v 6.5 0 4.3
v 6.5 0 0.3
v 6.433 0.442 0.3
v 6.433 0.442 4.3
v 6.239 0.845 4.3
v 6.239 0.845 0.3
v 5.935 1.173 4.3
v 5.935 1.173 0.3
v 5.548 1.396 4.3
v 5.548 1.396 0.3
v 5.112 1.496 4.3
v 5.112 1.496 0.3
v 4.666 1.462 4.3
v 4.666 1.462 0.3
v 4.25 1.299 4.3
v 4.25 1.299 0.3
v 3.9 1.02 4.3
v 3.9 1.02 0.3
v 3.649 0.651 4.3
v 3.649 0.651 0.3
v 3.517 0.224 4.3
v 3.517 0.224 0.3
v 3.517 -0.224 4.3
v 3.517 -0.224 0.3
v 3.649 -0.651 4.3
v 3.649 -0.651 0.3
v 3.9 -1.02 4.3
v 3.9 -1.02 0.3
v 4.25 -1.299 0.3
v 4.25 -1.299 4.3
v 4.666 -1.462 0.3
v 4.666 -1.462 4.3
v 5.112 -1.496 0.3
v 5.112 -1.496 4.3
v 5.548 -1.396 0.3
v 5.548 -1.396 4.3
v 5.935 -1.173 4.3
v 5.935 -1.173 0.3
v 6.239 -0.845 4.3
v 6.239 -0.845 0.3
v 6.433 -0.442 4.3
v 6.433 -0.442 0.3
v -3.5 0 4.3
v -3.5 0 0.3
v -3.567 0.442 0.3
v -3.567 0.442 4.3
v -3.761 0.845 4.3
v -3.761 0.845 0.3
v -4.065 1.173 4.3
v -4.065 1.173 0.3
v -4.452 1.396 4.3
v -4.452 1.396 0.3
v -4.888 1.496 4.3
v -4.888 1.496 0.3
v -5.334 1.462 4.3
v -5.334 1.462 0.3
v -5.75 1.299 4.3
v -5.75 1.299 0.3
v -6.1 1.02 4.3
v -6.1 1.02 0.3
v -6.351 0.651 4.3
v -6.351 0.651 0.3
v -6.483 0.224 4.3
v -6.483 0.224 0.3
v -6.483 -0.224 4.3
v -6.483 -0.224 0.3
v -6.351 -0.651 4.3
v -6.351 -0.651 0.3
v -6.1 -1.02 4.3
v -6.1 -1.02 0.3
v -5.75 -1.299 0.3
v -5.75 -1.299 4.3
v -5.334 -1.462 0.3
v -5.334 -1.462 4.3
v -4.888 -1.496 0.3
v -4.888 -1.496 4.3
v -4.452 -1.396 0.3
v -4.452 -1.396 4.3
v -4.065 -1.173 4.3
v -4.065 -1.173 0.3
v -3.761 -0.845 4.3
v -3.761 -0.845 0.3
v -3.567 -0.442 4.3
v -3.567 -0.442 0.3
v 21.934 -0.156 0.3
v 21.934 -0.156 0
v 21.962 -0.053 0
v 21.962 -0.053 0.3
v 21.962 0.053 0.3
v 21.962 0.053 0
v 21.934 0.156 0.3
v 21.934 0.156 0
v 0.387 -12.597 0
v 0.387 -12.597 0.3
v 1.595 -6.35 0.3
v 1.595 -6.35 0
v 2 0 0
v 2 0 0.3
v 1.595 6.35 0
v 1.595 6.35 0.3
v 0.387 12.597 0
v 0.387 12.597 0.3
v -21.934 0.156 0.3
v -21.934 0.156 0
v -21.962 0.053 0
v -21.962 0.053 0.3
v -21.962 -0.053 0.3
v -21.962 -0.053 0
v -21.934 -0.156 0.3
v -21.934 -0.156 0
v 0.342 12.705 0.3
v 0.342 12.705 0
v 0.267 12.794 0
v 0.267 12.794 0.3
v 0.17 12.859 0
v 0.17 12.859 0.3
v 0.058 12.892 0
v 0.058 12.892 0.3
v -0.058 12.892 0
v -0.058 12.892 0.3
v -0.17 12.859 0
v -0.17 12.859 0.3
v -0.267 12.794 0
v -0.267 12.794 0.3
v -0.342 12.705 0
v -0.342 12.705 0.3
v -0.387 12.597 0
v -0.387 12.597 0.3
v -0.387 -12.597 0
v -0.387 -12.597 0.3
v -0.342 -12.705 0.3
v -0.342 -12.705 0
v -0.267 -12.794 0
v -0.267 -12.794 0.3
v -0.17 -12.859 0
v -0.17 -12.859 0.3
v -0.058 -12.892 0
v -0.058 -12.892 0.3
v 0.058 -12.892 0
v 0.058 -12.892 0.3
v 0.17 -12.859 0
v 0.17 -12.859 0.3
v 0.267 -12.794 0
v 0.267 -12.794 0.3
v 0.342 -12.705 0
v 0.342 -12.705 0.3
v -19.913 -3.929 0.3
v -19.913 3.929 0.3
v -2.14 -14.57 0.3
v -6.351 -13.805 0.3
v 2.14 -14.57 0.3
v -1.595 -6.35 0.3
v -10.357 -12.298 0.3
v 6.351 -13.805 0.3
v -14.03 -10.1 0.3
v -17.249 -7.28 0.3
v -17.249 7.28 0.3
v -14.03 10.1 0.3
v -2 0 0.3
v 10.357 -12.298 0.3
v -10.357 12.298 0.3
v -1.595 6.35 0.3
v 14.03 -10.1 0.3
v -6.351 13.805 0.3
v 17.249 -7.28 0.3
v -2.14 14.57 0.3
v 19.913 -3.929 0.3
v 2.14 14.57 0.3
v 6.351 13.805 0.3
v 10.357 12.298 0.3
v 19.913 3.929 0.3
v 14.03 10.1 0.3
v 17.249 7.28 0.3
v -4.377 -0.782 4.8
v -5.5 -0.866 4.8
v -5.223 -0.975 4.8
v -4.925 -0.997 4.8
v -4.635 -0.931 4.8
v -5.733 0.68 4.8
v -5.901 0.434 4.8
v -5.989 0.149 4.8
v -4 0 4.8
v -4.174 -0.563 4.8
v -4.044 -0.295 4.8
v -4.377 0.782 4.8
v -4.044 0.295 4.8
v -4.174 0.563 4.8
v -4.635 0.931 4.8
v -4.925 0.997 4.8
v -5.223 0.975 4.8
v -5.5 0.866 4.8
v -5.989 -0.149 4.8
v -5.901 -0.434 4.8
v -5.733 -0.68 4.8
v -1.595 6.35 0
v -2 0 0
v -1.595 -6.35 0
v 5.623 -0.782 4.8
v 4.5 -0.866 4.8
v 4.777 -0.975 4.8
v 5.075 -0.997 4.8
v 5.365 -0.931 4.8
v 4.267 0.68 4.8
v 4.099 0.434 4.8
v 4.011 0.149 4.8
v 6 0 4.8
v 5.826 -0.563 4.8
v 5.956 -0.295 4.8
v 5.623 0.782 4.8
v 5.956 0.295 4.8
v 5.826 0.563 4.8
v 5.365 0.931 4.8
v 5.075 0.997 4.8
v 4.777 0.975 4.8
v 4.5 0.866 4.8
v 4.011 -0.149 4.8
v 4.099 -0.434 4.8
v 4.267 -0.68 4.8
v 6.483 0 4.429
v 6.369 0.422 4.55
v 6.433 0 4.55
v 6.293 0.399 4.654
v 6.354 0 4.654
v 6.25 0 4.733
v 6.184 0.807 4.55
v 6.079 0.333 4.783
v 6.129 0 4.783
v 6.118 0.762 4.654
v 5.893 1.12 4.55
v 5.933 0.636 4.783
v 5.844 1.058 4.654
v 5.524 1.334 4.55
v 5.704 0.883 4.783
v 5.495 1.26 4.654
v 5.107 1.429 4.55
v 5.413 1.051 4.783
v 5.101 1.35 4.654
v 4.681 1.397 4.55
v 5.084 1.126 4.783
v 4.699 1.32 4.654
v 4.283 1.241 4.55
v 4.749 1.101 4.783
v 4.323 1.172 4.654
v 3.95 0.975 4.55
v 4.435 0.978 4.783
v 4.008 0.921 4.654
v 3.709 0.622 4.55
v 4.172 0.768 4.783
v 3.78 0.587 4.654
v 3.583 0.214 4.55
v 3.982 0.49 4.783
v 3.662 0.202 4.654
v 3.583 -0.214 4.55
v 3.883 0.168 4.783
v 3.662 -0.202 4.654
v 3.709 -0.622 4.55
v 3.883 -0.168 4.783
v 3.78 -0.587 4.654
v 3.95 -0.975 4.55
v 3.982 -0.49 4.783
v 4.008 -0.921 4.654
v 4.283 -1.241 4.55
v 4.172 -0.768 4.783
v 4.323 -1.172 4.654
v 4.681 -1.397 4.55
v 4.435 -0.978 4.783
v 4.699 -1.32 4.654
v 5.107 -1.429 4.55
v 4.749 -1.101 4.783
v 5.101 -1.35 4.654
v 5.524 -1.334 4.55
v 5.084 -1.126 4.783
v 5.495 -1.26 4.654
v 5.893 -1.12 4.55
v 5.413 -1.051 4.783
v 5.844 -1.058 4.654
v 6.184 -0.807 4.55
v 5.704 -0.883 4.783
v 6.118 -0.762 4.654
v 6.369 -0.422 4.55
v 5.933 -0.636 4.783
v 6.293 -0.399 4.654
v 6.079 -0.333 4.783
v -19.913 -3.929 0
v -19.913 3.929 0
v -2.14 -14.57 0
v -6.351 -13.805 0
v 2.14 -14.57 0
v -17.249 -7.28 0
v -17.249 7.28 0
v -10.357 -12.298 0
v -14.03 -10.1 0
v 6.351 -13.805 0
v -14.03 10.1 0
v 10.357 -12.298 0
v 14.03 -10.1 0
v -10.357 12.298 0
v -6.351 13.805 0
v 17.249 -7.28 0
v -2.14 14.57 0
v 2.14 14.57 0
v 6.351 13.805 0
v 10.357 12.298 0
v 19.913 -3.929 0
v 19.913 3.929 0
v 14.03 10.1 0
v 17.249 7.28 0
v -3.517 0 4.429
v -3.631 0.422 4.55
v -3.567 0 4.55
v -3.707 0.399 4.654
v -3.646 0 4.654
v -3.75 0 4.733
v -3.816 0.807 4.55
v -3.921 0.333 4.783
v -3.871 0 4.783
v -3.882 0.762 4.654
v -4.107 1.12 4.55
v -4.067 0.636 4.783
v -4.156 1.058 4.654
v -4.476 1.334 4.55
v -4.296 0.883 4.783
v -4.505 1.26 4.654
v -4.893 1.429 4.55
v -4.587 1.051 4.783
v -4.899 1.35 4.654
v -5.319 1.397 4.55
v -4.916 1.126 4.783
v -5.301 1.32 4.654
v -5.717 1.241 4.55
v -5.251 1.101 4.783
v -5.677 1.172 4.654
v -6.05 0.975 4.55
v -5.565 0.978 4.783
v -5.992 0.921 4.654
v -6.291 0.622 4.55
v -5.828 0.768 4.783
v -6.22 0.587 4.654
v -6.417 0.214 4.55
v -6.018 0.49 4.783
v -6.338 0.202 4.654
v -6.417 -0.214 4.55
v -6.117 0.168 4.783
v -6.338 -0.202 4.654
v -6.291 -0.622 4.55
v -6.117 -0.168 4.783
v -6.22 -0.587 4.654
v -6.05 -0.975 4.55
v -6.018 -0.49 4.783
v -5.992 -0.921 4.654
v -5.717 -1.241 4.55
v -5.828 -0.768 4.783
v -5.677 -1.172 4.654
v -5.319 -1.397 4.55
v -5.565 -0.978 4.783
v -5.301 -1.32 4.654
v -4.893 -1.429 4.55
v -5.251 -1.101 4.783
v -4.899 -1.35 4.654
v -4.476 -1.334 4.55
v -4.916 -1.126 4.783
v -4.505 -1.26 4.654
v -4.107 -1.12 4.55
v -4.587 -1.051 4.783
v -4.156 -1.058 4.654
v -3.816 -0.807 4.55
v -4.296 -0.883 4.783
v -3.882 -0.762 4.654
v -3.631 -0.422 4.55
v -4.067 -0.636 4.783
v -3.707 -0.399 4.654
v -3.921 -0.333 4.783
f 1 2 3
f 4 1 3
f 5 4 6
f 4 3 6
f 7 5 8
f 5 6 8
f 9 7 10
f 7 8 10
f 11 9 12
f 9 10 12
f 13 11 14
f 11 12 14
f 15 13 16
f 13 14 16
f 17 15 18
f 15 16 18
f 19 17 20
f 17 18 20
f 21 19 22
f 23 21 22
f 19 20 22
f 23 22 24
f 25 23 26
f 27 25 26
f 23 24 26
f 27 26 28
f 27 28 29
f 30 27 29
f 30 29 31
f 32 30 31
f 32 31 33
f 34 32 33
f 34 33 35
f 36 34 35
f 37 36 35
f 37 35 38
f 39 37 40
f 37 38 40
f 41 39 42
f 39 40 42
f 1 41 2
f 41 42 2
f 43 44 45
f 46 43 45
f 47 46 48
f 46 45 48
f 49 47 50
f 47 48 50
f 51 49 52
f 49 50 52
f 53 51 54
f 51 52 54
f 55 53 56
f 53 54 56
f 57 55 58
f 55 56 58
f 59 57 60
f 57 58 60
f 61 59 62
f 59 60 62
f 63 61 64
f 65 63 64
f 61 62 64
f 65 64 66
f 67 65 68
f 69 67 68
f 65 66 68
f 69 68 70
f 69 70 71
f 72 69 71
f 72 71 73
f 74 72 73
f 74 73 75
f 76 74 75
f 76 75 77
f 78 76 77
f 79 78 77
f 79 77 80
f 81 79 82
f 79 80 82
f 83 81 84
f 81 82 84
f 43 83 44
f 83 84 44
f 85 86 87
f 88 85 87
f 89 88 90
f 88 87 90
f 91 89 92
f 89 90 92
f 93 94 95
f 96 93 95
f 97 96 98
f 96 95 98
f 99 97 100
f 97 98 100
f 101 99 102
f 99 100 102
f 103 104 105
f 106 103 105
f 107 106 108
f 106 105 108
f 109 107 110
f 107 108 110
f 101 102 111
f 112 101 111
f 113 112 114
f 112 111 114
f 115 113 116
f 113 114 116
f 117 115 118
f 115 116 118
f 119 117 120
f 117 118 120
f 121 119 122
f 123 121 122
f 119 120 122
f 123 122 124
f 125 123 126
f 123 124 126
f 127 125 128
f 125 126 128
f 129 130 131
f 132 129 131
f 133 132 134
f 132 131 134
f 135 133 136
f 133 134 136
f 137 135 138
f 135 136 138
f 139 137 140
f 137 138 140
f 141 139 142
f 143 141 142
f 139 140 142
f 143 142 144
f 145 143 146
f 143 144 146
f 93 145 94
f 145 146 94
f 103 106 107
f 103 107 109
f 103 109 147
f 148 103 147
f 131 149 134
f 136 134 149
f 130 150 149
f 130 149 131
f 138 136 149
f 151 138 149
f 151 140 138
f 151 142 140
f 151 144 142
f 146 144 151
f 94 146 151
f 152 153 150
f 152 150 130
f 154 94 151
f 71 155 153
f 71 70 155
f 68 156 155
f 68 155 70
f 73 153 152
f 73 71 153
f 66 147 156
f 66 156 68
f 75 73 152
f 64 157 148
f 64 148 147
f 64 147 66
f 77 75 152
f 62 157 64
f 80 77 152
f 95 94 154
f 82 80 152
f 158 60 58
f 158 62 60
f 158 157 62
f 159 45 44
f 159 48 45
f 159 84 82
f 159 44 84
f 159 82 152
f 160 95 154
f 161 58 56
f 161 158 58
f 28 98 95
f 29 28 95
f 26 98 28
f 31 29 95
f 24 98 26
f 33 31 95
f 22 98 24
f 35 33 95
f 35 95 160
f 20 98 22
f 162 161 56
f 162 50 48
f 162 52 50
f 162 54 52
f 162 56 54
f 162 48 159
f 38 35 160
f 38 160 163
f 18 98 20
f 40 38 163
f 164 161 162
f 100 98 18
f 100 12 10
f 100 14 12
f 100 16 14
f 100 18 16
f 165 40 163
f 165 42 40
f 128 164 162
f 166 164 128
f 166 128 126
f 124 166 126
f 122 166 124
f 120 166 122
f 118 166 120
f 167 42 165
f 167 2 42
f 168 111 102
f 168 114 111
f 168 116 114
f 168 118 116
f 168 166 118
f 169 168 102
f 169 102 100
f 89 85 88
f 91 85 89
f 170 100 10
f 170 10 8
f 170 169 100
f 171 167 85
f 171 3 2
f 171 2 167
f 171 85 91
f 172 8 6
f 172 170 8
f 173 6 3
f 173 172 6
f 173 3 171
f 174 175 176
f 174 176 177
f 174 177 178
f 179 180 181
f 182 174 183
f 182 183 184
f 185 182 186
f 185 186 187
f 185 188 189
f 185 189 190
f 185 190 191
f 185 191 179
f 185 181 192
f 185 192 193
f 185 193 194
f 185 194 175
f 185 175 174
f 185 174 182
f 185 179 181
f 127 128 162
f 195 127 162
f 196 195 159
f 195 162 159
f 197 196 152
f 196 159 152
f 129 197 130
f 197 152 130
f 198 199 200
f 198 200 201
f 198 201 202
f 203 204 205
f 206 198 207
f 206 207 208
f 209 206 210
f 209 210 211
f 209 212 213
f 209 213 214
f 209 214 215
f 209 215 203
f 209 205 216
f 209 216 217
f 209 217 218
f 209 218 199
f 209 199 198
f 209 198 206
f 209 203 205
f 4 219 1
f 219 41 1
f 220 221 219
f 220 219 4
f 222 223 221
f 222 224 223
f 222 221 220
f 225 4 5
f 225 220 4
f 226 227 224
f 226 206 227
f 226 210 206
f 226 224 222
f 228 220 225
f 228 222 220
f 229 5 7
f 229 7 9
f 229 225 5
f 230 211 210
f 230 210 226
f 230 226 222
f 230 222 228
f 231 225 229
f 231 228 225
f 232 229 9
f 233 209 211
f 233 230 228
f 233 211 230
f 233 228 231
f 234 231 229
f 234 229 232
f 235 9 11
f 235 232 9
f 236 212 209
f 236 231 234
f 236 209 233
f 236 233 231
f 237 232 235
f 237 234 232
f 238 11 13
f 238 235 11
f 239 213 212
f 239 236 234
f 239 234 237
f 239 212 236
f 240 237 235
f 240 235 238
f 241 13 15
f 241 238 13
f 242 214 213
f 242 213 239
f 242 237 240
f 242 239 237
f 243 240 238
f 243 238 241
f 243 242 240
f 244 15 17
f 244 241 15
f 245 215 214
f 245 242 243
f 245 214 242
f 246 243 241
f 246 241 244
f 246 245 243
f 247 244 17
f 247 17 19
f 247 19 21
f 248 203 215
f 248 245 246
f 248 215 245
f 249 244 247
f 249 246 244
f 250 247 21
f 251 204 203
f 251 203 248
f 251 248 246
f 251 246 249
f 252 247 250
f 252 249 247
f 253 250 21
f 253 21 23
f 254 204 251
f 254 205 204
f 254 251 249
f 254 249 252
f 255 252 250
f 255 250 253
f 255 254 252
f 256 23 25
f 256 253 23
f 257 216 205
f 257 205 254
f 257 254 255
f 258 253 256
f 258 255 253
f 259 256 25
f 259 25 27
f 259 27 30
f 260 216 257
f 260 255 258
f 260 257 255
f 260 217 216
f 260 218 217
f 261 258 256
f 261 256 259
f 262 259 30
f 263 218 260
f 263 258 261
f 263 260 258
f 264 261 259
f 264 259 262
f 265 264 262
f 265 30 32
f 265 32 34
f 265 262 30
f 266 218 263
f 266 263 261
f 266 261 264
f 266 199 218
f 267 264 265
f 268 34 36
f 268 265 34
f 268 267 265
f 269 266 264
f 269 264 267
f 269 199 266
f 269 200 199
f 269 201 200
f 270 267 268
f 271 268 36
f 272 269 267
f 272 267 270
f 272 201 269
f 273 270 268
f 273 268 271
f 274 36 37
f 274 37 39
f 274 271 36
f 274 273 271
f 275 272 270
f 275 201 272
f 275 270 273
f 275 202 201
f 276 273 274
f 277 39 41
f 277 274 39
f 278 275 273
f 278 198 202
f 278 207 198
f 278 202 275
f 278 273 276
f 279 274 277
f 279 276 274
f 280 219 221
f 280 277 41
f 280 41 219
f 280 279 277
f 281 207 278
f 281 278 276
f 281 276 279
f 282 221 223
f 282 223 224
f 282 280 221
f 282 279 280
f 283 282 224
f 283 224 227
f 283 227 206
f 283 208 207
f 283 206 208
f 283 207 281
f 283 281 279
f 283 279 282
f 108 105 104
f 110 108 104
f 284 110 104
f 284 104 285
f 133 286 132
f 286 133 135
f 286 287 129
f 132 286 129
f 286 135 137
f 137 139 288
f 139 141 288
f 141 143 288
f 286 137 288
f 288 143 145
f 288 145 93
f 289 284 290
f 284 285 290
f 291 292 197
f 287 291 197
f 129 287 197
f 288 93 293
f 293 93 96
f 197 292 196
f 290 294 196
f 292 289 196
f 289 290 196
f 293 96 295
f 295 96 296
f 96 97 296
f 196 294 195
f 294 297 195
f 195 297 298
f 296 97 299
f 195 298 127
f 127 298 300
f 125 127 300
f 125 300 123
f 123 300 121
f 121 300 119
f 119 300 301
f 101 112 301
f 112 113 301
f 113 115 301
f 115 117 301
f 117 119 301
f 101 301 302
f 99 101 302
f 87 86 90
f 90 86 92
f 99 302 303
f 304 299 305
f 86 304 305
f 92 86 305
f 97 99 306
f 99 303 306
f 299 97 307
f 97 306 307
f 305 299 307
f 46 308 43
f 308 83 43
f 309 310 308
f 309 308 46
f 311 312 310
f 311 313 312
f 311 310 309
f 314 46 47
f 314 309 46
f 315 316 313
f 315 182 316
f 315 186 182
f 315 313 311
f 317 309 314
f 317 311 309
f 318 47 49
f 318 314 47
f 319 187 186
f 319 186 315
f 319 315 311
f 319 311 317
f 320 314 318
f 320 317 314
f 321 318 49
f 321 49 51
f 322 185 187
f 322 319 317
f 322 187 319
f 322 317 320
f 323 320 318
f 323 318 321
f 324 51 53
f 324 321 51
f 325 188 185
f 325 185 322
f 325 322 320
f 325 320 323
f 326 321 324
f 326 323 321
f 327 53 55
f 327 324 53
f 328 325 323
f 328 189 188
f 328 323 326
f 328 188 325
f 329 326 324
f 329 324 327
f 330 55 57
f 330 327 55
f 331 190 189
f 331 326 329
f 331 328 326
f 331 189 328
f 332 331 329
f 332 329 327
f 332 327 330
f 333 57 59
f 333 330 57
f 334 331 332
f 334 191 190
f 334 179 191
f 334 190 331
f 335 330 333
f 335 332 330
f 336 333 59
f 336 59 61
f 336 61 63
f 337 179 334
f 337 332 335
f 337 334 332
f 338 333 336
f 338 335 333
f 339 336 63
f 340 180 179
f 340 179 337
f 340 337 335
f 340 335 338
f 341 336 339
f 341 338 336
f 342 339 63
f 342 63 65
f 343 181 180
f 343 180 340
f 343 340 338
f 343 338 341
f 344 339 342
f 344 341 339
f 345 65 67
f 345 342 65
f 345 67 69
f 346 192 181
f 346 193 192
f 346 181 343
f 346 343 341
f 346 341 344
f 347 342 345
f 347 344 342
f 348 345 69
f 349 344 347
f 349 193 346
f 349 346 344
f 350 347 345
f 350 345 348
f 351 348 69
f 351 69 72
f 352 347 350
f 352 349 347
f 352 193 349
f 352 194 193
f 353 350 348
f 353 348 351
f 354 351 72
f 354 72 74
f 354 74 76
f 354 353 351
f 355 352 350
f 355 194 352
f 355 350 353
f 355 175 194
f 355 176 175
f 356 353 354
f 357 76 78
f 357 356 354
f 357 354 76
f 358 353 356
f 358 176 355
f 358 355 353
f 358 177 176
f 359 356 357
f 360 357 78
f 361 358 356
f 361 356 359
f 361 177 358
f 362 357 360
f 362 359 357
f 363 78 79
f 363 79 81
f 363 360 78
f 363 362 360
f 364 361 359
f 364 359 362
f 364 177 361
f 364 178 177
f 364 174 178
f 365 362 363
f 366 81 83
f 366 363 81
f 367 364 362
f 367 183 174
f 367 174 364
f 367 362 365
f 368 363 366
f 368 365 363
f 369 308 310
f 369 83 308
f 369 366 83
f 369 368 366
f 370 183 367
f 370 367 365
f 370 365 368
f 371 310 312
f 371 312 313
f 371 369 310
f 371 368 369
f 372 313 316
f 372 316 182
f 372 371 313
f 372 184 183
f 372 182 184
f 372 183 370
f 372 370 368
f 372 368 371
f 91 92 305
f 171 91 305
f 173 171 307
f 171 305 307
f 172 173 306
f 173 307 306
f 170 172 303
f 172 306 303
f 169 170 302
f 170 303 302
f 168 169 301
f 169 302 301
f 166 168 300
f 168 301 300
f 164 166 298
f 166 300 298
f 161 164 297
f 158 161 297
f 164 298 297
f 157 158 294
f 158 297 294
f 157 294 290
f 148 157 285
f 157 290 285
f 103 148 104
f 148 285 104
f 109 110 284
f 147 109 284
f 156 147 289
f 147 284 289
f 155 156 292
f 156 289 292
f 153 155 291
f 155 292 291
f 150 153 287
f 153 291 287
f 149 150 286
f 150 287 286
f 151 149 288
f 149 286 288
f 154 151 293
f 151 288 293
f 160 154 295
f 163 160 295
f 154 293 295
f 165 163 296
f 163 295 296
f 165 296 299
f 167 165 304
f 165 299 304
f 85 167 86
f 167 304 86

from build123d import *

# Parameters (mm, degrees)
F3_DEPTH = 0.3
F4_R     = 1.5
F5_DEPTH = 4.5
F6_R     = 0.5
F8_DEPTH = 0.301


with BuildPart() as f3:
    # F2 (on Top) → F3 (new body)
    with BuildSketch(Plane.XY):
        with BuildLine():
            ThreePointArc((21.9341482237, -0.1564722617), (21.9660226591, 0), (21.9341482237, 0.1564722617))
            ThreePointArc((21.9341482237, 0.1564722617), (0, 14.6666666667), (-21.9341482237, 0.1564722617))
            ThreePointArc((-21.9341482237, 0.1564722617), (-21.9660226591, 0), (-21.9341482237, -0.1564722617))
            ThreePointArc((-21.9341482237, -0.1564722617), (0, -14.6666666667), (21.9341482237, -0.1564722617))
        make_face()
    extrude(amount=F3_DEPTH)

    # F4 (on face) → F5 (join)
    with BuildSketch(Plane.XY.offset(0.3)):
        with Locations((-5, 0)):
            Circle(F4_R)
        with Locations((5, 0)):
            Circle(F4_R)
    extrude(amount=F5_DEPTH)

    # F6
    f6_edges = [f3.edges().sort_by_distance(p)[0] for p in [
        (-6.5, 0, 4.8),
        (3.5, 0, 4.8),
    ]]
    fillet(f6_edges, radius=F6_R)

    # F7 (on face) → F8 (cut, through all)
    with BuildSketch(Plane.XY.offset(0.3)):
        with BuildLine():
            ThreePointArc((-0.3870967742, -12.5971768966), (0, -12.8963994815), (0.3870967742, -12.5971768966))
            ThreePointArc((0.3870967742, -12.5971768966), (2, 0), (0.3870967742, 12.5971768966))
            ThreePointArc((0.3870967742, 12.5971768966), (0, 12.8963994815), (-0.3870967742, 12.5971768966))
            ThreePointArc((-0.3870967742, 12.5971768966), (-2, 0), (-0.3870967742, -12.5971768966))
        make_face()
    extrude(amount=-F8_DEPTH, mode=Mode.SUBTRACT)


solid = f3.part
